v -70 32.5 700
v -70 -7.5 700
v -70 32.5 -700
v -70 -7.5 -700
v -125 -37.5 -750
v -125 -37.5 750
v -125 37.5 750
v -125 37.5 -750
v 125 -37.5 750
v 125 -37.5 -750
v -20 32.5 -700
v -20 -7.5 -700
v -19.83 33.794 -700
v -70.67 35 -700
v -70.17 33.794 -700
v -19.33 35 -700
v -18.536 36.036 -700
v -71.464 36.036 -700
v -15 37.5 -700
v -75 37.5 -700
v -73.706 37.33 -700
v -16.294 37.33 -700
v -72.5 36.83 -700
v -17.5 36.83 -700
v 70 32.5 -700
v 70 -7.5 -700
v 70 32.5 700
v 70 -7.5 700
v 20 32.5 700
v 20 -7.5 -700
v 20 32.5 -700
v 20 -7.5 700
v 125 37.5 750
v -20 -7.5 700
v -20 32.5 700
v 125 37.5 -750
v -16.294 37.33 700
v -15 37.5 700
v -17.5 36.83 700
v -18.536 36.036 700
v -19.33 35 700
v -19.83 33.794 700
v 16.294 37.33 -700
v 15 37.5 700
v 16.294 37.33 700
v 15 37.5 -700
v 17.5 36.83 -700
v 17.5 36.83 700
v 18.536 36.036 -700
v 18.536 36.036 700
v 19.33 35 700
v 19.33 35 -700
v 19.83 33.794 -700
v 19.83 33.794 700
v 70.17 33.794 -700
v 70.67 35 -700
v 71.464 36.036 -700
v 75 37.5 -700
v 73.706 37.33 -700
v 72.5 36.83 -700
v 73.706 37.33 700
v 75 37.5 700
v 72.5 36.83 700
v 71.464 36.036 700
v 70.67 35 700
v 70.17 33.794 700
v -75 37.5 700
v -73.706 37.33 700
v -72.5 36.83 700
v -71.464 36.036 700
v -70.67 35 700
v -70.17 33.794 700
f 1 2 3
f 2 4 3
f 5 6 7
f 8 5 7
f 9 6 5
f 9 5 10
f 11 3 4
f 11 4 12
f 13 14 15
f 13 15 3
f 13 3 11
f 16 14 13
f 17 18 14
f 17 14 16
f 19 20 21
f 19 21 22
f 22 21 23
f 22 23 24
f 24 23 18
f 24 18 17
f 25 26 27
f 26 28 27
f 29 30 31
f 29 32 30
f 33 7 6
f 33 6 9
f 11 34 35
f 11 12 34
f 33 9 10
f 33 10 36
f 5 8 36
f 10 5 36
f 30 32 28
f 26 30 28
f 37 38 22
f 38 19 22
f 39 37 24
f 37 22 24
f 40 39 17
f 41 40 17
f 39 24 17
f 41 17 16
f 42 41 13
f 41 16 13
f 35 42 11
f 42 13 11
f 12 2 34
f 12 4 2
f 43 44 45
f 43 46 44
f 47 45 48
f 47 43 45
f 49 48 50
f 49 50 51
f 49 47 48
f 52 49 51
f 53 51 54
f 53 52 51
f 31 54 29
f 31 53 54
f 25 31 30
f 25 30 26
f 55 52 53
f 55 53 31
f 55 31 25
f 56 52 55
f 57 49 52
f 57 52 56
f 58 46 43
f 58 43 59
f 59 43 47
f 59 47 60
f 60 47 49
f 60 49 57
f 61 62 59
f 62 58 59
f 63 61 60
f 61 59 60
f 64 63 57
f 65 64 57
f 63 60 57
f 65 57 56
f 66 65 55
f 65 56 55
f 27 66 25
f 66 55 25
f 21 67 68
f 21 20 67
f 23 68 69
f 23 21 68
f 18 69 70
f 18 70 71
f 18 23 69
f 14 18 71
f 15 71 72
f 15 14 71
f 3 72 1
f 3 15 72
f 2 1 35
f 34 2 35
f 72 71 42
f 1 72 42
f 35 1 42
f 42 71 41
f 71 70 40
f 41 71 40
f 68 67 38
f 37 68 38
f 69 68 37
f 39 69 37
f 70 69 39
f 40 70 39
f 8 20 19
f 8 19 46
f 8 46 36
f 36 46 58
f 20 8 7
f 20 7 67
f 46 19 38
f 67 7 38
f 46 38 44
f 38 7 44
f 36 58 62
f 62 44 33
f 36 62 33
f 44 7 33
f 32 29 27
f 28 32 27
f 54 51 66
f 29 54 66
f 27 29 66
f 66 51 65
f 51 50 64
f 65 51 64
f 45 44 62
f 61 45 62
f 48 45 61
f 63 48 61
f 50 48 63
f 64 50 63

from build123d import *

# Parameters (mm, degrees)
SKETCH1_W           = 250
SKETCH1_H           = 75
BOSS_EXTRUDE1_DEPTH = 750
SKETCH2_W           = 50
SKETCH2_H           = 45
CUT_EXTRUDE1_DEPTH  = 700
FILLET1_R           = 5


with BuildPart() as part:
    # Sketch1 → Boss-Extrude1 (new, symmetric)
    with BuildSketch(Plane.XY):
        Rectangle(SKETCH1_W, SKETCH1_H)
    extrude(amount=BOSS_EXTRUDE1_DEPTH, both=True)

    # Sketch2 → Cut-Extrude1 (cut, symmetric)
    with BuildSketch(Plane.XY):
        with Locations((-45, 15)):
            Rectangle(SKETCH2_W, SKETCH2_H)
        with Locations((45, 15)):
            Rectangle(SKETCH2_W, SKETCH2_H)
    extrude(amount=CUT_EXTRUDE1_DEPTH, both=True, mode=Mode.SUBTRACT)

    # Fillet1
    fillet1_edges = [part.edges().sort_by_distance(p)[0] for p in [
        (-70, 37.5, 0),
        (-20, 37.5, 0),
        (20, 37.5, 0),
        (70, 37.5, 0),
    ]]
    fillet(fillet1_edges, radius=FILLET1_R)


solid = part.part
